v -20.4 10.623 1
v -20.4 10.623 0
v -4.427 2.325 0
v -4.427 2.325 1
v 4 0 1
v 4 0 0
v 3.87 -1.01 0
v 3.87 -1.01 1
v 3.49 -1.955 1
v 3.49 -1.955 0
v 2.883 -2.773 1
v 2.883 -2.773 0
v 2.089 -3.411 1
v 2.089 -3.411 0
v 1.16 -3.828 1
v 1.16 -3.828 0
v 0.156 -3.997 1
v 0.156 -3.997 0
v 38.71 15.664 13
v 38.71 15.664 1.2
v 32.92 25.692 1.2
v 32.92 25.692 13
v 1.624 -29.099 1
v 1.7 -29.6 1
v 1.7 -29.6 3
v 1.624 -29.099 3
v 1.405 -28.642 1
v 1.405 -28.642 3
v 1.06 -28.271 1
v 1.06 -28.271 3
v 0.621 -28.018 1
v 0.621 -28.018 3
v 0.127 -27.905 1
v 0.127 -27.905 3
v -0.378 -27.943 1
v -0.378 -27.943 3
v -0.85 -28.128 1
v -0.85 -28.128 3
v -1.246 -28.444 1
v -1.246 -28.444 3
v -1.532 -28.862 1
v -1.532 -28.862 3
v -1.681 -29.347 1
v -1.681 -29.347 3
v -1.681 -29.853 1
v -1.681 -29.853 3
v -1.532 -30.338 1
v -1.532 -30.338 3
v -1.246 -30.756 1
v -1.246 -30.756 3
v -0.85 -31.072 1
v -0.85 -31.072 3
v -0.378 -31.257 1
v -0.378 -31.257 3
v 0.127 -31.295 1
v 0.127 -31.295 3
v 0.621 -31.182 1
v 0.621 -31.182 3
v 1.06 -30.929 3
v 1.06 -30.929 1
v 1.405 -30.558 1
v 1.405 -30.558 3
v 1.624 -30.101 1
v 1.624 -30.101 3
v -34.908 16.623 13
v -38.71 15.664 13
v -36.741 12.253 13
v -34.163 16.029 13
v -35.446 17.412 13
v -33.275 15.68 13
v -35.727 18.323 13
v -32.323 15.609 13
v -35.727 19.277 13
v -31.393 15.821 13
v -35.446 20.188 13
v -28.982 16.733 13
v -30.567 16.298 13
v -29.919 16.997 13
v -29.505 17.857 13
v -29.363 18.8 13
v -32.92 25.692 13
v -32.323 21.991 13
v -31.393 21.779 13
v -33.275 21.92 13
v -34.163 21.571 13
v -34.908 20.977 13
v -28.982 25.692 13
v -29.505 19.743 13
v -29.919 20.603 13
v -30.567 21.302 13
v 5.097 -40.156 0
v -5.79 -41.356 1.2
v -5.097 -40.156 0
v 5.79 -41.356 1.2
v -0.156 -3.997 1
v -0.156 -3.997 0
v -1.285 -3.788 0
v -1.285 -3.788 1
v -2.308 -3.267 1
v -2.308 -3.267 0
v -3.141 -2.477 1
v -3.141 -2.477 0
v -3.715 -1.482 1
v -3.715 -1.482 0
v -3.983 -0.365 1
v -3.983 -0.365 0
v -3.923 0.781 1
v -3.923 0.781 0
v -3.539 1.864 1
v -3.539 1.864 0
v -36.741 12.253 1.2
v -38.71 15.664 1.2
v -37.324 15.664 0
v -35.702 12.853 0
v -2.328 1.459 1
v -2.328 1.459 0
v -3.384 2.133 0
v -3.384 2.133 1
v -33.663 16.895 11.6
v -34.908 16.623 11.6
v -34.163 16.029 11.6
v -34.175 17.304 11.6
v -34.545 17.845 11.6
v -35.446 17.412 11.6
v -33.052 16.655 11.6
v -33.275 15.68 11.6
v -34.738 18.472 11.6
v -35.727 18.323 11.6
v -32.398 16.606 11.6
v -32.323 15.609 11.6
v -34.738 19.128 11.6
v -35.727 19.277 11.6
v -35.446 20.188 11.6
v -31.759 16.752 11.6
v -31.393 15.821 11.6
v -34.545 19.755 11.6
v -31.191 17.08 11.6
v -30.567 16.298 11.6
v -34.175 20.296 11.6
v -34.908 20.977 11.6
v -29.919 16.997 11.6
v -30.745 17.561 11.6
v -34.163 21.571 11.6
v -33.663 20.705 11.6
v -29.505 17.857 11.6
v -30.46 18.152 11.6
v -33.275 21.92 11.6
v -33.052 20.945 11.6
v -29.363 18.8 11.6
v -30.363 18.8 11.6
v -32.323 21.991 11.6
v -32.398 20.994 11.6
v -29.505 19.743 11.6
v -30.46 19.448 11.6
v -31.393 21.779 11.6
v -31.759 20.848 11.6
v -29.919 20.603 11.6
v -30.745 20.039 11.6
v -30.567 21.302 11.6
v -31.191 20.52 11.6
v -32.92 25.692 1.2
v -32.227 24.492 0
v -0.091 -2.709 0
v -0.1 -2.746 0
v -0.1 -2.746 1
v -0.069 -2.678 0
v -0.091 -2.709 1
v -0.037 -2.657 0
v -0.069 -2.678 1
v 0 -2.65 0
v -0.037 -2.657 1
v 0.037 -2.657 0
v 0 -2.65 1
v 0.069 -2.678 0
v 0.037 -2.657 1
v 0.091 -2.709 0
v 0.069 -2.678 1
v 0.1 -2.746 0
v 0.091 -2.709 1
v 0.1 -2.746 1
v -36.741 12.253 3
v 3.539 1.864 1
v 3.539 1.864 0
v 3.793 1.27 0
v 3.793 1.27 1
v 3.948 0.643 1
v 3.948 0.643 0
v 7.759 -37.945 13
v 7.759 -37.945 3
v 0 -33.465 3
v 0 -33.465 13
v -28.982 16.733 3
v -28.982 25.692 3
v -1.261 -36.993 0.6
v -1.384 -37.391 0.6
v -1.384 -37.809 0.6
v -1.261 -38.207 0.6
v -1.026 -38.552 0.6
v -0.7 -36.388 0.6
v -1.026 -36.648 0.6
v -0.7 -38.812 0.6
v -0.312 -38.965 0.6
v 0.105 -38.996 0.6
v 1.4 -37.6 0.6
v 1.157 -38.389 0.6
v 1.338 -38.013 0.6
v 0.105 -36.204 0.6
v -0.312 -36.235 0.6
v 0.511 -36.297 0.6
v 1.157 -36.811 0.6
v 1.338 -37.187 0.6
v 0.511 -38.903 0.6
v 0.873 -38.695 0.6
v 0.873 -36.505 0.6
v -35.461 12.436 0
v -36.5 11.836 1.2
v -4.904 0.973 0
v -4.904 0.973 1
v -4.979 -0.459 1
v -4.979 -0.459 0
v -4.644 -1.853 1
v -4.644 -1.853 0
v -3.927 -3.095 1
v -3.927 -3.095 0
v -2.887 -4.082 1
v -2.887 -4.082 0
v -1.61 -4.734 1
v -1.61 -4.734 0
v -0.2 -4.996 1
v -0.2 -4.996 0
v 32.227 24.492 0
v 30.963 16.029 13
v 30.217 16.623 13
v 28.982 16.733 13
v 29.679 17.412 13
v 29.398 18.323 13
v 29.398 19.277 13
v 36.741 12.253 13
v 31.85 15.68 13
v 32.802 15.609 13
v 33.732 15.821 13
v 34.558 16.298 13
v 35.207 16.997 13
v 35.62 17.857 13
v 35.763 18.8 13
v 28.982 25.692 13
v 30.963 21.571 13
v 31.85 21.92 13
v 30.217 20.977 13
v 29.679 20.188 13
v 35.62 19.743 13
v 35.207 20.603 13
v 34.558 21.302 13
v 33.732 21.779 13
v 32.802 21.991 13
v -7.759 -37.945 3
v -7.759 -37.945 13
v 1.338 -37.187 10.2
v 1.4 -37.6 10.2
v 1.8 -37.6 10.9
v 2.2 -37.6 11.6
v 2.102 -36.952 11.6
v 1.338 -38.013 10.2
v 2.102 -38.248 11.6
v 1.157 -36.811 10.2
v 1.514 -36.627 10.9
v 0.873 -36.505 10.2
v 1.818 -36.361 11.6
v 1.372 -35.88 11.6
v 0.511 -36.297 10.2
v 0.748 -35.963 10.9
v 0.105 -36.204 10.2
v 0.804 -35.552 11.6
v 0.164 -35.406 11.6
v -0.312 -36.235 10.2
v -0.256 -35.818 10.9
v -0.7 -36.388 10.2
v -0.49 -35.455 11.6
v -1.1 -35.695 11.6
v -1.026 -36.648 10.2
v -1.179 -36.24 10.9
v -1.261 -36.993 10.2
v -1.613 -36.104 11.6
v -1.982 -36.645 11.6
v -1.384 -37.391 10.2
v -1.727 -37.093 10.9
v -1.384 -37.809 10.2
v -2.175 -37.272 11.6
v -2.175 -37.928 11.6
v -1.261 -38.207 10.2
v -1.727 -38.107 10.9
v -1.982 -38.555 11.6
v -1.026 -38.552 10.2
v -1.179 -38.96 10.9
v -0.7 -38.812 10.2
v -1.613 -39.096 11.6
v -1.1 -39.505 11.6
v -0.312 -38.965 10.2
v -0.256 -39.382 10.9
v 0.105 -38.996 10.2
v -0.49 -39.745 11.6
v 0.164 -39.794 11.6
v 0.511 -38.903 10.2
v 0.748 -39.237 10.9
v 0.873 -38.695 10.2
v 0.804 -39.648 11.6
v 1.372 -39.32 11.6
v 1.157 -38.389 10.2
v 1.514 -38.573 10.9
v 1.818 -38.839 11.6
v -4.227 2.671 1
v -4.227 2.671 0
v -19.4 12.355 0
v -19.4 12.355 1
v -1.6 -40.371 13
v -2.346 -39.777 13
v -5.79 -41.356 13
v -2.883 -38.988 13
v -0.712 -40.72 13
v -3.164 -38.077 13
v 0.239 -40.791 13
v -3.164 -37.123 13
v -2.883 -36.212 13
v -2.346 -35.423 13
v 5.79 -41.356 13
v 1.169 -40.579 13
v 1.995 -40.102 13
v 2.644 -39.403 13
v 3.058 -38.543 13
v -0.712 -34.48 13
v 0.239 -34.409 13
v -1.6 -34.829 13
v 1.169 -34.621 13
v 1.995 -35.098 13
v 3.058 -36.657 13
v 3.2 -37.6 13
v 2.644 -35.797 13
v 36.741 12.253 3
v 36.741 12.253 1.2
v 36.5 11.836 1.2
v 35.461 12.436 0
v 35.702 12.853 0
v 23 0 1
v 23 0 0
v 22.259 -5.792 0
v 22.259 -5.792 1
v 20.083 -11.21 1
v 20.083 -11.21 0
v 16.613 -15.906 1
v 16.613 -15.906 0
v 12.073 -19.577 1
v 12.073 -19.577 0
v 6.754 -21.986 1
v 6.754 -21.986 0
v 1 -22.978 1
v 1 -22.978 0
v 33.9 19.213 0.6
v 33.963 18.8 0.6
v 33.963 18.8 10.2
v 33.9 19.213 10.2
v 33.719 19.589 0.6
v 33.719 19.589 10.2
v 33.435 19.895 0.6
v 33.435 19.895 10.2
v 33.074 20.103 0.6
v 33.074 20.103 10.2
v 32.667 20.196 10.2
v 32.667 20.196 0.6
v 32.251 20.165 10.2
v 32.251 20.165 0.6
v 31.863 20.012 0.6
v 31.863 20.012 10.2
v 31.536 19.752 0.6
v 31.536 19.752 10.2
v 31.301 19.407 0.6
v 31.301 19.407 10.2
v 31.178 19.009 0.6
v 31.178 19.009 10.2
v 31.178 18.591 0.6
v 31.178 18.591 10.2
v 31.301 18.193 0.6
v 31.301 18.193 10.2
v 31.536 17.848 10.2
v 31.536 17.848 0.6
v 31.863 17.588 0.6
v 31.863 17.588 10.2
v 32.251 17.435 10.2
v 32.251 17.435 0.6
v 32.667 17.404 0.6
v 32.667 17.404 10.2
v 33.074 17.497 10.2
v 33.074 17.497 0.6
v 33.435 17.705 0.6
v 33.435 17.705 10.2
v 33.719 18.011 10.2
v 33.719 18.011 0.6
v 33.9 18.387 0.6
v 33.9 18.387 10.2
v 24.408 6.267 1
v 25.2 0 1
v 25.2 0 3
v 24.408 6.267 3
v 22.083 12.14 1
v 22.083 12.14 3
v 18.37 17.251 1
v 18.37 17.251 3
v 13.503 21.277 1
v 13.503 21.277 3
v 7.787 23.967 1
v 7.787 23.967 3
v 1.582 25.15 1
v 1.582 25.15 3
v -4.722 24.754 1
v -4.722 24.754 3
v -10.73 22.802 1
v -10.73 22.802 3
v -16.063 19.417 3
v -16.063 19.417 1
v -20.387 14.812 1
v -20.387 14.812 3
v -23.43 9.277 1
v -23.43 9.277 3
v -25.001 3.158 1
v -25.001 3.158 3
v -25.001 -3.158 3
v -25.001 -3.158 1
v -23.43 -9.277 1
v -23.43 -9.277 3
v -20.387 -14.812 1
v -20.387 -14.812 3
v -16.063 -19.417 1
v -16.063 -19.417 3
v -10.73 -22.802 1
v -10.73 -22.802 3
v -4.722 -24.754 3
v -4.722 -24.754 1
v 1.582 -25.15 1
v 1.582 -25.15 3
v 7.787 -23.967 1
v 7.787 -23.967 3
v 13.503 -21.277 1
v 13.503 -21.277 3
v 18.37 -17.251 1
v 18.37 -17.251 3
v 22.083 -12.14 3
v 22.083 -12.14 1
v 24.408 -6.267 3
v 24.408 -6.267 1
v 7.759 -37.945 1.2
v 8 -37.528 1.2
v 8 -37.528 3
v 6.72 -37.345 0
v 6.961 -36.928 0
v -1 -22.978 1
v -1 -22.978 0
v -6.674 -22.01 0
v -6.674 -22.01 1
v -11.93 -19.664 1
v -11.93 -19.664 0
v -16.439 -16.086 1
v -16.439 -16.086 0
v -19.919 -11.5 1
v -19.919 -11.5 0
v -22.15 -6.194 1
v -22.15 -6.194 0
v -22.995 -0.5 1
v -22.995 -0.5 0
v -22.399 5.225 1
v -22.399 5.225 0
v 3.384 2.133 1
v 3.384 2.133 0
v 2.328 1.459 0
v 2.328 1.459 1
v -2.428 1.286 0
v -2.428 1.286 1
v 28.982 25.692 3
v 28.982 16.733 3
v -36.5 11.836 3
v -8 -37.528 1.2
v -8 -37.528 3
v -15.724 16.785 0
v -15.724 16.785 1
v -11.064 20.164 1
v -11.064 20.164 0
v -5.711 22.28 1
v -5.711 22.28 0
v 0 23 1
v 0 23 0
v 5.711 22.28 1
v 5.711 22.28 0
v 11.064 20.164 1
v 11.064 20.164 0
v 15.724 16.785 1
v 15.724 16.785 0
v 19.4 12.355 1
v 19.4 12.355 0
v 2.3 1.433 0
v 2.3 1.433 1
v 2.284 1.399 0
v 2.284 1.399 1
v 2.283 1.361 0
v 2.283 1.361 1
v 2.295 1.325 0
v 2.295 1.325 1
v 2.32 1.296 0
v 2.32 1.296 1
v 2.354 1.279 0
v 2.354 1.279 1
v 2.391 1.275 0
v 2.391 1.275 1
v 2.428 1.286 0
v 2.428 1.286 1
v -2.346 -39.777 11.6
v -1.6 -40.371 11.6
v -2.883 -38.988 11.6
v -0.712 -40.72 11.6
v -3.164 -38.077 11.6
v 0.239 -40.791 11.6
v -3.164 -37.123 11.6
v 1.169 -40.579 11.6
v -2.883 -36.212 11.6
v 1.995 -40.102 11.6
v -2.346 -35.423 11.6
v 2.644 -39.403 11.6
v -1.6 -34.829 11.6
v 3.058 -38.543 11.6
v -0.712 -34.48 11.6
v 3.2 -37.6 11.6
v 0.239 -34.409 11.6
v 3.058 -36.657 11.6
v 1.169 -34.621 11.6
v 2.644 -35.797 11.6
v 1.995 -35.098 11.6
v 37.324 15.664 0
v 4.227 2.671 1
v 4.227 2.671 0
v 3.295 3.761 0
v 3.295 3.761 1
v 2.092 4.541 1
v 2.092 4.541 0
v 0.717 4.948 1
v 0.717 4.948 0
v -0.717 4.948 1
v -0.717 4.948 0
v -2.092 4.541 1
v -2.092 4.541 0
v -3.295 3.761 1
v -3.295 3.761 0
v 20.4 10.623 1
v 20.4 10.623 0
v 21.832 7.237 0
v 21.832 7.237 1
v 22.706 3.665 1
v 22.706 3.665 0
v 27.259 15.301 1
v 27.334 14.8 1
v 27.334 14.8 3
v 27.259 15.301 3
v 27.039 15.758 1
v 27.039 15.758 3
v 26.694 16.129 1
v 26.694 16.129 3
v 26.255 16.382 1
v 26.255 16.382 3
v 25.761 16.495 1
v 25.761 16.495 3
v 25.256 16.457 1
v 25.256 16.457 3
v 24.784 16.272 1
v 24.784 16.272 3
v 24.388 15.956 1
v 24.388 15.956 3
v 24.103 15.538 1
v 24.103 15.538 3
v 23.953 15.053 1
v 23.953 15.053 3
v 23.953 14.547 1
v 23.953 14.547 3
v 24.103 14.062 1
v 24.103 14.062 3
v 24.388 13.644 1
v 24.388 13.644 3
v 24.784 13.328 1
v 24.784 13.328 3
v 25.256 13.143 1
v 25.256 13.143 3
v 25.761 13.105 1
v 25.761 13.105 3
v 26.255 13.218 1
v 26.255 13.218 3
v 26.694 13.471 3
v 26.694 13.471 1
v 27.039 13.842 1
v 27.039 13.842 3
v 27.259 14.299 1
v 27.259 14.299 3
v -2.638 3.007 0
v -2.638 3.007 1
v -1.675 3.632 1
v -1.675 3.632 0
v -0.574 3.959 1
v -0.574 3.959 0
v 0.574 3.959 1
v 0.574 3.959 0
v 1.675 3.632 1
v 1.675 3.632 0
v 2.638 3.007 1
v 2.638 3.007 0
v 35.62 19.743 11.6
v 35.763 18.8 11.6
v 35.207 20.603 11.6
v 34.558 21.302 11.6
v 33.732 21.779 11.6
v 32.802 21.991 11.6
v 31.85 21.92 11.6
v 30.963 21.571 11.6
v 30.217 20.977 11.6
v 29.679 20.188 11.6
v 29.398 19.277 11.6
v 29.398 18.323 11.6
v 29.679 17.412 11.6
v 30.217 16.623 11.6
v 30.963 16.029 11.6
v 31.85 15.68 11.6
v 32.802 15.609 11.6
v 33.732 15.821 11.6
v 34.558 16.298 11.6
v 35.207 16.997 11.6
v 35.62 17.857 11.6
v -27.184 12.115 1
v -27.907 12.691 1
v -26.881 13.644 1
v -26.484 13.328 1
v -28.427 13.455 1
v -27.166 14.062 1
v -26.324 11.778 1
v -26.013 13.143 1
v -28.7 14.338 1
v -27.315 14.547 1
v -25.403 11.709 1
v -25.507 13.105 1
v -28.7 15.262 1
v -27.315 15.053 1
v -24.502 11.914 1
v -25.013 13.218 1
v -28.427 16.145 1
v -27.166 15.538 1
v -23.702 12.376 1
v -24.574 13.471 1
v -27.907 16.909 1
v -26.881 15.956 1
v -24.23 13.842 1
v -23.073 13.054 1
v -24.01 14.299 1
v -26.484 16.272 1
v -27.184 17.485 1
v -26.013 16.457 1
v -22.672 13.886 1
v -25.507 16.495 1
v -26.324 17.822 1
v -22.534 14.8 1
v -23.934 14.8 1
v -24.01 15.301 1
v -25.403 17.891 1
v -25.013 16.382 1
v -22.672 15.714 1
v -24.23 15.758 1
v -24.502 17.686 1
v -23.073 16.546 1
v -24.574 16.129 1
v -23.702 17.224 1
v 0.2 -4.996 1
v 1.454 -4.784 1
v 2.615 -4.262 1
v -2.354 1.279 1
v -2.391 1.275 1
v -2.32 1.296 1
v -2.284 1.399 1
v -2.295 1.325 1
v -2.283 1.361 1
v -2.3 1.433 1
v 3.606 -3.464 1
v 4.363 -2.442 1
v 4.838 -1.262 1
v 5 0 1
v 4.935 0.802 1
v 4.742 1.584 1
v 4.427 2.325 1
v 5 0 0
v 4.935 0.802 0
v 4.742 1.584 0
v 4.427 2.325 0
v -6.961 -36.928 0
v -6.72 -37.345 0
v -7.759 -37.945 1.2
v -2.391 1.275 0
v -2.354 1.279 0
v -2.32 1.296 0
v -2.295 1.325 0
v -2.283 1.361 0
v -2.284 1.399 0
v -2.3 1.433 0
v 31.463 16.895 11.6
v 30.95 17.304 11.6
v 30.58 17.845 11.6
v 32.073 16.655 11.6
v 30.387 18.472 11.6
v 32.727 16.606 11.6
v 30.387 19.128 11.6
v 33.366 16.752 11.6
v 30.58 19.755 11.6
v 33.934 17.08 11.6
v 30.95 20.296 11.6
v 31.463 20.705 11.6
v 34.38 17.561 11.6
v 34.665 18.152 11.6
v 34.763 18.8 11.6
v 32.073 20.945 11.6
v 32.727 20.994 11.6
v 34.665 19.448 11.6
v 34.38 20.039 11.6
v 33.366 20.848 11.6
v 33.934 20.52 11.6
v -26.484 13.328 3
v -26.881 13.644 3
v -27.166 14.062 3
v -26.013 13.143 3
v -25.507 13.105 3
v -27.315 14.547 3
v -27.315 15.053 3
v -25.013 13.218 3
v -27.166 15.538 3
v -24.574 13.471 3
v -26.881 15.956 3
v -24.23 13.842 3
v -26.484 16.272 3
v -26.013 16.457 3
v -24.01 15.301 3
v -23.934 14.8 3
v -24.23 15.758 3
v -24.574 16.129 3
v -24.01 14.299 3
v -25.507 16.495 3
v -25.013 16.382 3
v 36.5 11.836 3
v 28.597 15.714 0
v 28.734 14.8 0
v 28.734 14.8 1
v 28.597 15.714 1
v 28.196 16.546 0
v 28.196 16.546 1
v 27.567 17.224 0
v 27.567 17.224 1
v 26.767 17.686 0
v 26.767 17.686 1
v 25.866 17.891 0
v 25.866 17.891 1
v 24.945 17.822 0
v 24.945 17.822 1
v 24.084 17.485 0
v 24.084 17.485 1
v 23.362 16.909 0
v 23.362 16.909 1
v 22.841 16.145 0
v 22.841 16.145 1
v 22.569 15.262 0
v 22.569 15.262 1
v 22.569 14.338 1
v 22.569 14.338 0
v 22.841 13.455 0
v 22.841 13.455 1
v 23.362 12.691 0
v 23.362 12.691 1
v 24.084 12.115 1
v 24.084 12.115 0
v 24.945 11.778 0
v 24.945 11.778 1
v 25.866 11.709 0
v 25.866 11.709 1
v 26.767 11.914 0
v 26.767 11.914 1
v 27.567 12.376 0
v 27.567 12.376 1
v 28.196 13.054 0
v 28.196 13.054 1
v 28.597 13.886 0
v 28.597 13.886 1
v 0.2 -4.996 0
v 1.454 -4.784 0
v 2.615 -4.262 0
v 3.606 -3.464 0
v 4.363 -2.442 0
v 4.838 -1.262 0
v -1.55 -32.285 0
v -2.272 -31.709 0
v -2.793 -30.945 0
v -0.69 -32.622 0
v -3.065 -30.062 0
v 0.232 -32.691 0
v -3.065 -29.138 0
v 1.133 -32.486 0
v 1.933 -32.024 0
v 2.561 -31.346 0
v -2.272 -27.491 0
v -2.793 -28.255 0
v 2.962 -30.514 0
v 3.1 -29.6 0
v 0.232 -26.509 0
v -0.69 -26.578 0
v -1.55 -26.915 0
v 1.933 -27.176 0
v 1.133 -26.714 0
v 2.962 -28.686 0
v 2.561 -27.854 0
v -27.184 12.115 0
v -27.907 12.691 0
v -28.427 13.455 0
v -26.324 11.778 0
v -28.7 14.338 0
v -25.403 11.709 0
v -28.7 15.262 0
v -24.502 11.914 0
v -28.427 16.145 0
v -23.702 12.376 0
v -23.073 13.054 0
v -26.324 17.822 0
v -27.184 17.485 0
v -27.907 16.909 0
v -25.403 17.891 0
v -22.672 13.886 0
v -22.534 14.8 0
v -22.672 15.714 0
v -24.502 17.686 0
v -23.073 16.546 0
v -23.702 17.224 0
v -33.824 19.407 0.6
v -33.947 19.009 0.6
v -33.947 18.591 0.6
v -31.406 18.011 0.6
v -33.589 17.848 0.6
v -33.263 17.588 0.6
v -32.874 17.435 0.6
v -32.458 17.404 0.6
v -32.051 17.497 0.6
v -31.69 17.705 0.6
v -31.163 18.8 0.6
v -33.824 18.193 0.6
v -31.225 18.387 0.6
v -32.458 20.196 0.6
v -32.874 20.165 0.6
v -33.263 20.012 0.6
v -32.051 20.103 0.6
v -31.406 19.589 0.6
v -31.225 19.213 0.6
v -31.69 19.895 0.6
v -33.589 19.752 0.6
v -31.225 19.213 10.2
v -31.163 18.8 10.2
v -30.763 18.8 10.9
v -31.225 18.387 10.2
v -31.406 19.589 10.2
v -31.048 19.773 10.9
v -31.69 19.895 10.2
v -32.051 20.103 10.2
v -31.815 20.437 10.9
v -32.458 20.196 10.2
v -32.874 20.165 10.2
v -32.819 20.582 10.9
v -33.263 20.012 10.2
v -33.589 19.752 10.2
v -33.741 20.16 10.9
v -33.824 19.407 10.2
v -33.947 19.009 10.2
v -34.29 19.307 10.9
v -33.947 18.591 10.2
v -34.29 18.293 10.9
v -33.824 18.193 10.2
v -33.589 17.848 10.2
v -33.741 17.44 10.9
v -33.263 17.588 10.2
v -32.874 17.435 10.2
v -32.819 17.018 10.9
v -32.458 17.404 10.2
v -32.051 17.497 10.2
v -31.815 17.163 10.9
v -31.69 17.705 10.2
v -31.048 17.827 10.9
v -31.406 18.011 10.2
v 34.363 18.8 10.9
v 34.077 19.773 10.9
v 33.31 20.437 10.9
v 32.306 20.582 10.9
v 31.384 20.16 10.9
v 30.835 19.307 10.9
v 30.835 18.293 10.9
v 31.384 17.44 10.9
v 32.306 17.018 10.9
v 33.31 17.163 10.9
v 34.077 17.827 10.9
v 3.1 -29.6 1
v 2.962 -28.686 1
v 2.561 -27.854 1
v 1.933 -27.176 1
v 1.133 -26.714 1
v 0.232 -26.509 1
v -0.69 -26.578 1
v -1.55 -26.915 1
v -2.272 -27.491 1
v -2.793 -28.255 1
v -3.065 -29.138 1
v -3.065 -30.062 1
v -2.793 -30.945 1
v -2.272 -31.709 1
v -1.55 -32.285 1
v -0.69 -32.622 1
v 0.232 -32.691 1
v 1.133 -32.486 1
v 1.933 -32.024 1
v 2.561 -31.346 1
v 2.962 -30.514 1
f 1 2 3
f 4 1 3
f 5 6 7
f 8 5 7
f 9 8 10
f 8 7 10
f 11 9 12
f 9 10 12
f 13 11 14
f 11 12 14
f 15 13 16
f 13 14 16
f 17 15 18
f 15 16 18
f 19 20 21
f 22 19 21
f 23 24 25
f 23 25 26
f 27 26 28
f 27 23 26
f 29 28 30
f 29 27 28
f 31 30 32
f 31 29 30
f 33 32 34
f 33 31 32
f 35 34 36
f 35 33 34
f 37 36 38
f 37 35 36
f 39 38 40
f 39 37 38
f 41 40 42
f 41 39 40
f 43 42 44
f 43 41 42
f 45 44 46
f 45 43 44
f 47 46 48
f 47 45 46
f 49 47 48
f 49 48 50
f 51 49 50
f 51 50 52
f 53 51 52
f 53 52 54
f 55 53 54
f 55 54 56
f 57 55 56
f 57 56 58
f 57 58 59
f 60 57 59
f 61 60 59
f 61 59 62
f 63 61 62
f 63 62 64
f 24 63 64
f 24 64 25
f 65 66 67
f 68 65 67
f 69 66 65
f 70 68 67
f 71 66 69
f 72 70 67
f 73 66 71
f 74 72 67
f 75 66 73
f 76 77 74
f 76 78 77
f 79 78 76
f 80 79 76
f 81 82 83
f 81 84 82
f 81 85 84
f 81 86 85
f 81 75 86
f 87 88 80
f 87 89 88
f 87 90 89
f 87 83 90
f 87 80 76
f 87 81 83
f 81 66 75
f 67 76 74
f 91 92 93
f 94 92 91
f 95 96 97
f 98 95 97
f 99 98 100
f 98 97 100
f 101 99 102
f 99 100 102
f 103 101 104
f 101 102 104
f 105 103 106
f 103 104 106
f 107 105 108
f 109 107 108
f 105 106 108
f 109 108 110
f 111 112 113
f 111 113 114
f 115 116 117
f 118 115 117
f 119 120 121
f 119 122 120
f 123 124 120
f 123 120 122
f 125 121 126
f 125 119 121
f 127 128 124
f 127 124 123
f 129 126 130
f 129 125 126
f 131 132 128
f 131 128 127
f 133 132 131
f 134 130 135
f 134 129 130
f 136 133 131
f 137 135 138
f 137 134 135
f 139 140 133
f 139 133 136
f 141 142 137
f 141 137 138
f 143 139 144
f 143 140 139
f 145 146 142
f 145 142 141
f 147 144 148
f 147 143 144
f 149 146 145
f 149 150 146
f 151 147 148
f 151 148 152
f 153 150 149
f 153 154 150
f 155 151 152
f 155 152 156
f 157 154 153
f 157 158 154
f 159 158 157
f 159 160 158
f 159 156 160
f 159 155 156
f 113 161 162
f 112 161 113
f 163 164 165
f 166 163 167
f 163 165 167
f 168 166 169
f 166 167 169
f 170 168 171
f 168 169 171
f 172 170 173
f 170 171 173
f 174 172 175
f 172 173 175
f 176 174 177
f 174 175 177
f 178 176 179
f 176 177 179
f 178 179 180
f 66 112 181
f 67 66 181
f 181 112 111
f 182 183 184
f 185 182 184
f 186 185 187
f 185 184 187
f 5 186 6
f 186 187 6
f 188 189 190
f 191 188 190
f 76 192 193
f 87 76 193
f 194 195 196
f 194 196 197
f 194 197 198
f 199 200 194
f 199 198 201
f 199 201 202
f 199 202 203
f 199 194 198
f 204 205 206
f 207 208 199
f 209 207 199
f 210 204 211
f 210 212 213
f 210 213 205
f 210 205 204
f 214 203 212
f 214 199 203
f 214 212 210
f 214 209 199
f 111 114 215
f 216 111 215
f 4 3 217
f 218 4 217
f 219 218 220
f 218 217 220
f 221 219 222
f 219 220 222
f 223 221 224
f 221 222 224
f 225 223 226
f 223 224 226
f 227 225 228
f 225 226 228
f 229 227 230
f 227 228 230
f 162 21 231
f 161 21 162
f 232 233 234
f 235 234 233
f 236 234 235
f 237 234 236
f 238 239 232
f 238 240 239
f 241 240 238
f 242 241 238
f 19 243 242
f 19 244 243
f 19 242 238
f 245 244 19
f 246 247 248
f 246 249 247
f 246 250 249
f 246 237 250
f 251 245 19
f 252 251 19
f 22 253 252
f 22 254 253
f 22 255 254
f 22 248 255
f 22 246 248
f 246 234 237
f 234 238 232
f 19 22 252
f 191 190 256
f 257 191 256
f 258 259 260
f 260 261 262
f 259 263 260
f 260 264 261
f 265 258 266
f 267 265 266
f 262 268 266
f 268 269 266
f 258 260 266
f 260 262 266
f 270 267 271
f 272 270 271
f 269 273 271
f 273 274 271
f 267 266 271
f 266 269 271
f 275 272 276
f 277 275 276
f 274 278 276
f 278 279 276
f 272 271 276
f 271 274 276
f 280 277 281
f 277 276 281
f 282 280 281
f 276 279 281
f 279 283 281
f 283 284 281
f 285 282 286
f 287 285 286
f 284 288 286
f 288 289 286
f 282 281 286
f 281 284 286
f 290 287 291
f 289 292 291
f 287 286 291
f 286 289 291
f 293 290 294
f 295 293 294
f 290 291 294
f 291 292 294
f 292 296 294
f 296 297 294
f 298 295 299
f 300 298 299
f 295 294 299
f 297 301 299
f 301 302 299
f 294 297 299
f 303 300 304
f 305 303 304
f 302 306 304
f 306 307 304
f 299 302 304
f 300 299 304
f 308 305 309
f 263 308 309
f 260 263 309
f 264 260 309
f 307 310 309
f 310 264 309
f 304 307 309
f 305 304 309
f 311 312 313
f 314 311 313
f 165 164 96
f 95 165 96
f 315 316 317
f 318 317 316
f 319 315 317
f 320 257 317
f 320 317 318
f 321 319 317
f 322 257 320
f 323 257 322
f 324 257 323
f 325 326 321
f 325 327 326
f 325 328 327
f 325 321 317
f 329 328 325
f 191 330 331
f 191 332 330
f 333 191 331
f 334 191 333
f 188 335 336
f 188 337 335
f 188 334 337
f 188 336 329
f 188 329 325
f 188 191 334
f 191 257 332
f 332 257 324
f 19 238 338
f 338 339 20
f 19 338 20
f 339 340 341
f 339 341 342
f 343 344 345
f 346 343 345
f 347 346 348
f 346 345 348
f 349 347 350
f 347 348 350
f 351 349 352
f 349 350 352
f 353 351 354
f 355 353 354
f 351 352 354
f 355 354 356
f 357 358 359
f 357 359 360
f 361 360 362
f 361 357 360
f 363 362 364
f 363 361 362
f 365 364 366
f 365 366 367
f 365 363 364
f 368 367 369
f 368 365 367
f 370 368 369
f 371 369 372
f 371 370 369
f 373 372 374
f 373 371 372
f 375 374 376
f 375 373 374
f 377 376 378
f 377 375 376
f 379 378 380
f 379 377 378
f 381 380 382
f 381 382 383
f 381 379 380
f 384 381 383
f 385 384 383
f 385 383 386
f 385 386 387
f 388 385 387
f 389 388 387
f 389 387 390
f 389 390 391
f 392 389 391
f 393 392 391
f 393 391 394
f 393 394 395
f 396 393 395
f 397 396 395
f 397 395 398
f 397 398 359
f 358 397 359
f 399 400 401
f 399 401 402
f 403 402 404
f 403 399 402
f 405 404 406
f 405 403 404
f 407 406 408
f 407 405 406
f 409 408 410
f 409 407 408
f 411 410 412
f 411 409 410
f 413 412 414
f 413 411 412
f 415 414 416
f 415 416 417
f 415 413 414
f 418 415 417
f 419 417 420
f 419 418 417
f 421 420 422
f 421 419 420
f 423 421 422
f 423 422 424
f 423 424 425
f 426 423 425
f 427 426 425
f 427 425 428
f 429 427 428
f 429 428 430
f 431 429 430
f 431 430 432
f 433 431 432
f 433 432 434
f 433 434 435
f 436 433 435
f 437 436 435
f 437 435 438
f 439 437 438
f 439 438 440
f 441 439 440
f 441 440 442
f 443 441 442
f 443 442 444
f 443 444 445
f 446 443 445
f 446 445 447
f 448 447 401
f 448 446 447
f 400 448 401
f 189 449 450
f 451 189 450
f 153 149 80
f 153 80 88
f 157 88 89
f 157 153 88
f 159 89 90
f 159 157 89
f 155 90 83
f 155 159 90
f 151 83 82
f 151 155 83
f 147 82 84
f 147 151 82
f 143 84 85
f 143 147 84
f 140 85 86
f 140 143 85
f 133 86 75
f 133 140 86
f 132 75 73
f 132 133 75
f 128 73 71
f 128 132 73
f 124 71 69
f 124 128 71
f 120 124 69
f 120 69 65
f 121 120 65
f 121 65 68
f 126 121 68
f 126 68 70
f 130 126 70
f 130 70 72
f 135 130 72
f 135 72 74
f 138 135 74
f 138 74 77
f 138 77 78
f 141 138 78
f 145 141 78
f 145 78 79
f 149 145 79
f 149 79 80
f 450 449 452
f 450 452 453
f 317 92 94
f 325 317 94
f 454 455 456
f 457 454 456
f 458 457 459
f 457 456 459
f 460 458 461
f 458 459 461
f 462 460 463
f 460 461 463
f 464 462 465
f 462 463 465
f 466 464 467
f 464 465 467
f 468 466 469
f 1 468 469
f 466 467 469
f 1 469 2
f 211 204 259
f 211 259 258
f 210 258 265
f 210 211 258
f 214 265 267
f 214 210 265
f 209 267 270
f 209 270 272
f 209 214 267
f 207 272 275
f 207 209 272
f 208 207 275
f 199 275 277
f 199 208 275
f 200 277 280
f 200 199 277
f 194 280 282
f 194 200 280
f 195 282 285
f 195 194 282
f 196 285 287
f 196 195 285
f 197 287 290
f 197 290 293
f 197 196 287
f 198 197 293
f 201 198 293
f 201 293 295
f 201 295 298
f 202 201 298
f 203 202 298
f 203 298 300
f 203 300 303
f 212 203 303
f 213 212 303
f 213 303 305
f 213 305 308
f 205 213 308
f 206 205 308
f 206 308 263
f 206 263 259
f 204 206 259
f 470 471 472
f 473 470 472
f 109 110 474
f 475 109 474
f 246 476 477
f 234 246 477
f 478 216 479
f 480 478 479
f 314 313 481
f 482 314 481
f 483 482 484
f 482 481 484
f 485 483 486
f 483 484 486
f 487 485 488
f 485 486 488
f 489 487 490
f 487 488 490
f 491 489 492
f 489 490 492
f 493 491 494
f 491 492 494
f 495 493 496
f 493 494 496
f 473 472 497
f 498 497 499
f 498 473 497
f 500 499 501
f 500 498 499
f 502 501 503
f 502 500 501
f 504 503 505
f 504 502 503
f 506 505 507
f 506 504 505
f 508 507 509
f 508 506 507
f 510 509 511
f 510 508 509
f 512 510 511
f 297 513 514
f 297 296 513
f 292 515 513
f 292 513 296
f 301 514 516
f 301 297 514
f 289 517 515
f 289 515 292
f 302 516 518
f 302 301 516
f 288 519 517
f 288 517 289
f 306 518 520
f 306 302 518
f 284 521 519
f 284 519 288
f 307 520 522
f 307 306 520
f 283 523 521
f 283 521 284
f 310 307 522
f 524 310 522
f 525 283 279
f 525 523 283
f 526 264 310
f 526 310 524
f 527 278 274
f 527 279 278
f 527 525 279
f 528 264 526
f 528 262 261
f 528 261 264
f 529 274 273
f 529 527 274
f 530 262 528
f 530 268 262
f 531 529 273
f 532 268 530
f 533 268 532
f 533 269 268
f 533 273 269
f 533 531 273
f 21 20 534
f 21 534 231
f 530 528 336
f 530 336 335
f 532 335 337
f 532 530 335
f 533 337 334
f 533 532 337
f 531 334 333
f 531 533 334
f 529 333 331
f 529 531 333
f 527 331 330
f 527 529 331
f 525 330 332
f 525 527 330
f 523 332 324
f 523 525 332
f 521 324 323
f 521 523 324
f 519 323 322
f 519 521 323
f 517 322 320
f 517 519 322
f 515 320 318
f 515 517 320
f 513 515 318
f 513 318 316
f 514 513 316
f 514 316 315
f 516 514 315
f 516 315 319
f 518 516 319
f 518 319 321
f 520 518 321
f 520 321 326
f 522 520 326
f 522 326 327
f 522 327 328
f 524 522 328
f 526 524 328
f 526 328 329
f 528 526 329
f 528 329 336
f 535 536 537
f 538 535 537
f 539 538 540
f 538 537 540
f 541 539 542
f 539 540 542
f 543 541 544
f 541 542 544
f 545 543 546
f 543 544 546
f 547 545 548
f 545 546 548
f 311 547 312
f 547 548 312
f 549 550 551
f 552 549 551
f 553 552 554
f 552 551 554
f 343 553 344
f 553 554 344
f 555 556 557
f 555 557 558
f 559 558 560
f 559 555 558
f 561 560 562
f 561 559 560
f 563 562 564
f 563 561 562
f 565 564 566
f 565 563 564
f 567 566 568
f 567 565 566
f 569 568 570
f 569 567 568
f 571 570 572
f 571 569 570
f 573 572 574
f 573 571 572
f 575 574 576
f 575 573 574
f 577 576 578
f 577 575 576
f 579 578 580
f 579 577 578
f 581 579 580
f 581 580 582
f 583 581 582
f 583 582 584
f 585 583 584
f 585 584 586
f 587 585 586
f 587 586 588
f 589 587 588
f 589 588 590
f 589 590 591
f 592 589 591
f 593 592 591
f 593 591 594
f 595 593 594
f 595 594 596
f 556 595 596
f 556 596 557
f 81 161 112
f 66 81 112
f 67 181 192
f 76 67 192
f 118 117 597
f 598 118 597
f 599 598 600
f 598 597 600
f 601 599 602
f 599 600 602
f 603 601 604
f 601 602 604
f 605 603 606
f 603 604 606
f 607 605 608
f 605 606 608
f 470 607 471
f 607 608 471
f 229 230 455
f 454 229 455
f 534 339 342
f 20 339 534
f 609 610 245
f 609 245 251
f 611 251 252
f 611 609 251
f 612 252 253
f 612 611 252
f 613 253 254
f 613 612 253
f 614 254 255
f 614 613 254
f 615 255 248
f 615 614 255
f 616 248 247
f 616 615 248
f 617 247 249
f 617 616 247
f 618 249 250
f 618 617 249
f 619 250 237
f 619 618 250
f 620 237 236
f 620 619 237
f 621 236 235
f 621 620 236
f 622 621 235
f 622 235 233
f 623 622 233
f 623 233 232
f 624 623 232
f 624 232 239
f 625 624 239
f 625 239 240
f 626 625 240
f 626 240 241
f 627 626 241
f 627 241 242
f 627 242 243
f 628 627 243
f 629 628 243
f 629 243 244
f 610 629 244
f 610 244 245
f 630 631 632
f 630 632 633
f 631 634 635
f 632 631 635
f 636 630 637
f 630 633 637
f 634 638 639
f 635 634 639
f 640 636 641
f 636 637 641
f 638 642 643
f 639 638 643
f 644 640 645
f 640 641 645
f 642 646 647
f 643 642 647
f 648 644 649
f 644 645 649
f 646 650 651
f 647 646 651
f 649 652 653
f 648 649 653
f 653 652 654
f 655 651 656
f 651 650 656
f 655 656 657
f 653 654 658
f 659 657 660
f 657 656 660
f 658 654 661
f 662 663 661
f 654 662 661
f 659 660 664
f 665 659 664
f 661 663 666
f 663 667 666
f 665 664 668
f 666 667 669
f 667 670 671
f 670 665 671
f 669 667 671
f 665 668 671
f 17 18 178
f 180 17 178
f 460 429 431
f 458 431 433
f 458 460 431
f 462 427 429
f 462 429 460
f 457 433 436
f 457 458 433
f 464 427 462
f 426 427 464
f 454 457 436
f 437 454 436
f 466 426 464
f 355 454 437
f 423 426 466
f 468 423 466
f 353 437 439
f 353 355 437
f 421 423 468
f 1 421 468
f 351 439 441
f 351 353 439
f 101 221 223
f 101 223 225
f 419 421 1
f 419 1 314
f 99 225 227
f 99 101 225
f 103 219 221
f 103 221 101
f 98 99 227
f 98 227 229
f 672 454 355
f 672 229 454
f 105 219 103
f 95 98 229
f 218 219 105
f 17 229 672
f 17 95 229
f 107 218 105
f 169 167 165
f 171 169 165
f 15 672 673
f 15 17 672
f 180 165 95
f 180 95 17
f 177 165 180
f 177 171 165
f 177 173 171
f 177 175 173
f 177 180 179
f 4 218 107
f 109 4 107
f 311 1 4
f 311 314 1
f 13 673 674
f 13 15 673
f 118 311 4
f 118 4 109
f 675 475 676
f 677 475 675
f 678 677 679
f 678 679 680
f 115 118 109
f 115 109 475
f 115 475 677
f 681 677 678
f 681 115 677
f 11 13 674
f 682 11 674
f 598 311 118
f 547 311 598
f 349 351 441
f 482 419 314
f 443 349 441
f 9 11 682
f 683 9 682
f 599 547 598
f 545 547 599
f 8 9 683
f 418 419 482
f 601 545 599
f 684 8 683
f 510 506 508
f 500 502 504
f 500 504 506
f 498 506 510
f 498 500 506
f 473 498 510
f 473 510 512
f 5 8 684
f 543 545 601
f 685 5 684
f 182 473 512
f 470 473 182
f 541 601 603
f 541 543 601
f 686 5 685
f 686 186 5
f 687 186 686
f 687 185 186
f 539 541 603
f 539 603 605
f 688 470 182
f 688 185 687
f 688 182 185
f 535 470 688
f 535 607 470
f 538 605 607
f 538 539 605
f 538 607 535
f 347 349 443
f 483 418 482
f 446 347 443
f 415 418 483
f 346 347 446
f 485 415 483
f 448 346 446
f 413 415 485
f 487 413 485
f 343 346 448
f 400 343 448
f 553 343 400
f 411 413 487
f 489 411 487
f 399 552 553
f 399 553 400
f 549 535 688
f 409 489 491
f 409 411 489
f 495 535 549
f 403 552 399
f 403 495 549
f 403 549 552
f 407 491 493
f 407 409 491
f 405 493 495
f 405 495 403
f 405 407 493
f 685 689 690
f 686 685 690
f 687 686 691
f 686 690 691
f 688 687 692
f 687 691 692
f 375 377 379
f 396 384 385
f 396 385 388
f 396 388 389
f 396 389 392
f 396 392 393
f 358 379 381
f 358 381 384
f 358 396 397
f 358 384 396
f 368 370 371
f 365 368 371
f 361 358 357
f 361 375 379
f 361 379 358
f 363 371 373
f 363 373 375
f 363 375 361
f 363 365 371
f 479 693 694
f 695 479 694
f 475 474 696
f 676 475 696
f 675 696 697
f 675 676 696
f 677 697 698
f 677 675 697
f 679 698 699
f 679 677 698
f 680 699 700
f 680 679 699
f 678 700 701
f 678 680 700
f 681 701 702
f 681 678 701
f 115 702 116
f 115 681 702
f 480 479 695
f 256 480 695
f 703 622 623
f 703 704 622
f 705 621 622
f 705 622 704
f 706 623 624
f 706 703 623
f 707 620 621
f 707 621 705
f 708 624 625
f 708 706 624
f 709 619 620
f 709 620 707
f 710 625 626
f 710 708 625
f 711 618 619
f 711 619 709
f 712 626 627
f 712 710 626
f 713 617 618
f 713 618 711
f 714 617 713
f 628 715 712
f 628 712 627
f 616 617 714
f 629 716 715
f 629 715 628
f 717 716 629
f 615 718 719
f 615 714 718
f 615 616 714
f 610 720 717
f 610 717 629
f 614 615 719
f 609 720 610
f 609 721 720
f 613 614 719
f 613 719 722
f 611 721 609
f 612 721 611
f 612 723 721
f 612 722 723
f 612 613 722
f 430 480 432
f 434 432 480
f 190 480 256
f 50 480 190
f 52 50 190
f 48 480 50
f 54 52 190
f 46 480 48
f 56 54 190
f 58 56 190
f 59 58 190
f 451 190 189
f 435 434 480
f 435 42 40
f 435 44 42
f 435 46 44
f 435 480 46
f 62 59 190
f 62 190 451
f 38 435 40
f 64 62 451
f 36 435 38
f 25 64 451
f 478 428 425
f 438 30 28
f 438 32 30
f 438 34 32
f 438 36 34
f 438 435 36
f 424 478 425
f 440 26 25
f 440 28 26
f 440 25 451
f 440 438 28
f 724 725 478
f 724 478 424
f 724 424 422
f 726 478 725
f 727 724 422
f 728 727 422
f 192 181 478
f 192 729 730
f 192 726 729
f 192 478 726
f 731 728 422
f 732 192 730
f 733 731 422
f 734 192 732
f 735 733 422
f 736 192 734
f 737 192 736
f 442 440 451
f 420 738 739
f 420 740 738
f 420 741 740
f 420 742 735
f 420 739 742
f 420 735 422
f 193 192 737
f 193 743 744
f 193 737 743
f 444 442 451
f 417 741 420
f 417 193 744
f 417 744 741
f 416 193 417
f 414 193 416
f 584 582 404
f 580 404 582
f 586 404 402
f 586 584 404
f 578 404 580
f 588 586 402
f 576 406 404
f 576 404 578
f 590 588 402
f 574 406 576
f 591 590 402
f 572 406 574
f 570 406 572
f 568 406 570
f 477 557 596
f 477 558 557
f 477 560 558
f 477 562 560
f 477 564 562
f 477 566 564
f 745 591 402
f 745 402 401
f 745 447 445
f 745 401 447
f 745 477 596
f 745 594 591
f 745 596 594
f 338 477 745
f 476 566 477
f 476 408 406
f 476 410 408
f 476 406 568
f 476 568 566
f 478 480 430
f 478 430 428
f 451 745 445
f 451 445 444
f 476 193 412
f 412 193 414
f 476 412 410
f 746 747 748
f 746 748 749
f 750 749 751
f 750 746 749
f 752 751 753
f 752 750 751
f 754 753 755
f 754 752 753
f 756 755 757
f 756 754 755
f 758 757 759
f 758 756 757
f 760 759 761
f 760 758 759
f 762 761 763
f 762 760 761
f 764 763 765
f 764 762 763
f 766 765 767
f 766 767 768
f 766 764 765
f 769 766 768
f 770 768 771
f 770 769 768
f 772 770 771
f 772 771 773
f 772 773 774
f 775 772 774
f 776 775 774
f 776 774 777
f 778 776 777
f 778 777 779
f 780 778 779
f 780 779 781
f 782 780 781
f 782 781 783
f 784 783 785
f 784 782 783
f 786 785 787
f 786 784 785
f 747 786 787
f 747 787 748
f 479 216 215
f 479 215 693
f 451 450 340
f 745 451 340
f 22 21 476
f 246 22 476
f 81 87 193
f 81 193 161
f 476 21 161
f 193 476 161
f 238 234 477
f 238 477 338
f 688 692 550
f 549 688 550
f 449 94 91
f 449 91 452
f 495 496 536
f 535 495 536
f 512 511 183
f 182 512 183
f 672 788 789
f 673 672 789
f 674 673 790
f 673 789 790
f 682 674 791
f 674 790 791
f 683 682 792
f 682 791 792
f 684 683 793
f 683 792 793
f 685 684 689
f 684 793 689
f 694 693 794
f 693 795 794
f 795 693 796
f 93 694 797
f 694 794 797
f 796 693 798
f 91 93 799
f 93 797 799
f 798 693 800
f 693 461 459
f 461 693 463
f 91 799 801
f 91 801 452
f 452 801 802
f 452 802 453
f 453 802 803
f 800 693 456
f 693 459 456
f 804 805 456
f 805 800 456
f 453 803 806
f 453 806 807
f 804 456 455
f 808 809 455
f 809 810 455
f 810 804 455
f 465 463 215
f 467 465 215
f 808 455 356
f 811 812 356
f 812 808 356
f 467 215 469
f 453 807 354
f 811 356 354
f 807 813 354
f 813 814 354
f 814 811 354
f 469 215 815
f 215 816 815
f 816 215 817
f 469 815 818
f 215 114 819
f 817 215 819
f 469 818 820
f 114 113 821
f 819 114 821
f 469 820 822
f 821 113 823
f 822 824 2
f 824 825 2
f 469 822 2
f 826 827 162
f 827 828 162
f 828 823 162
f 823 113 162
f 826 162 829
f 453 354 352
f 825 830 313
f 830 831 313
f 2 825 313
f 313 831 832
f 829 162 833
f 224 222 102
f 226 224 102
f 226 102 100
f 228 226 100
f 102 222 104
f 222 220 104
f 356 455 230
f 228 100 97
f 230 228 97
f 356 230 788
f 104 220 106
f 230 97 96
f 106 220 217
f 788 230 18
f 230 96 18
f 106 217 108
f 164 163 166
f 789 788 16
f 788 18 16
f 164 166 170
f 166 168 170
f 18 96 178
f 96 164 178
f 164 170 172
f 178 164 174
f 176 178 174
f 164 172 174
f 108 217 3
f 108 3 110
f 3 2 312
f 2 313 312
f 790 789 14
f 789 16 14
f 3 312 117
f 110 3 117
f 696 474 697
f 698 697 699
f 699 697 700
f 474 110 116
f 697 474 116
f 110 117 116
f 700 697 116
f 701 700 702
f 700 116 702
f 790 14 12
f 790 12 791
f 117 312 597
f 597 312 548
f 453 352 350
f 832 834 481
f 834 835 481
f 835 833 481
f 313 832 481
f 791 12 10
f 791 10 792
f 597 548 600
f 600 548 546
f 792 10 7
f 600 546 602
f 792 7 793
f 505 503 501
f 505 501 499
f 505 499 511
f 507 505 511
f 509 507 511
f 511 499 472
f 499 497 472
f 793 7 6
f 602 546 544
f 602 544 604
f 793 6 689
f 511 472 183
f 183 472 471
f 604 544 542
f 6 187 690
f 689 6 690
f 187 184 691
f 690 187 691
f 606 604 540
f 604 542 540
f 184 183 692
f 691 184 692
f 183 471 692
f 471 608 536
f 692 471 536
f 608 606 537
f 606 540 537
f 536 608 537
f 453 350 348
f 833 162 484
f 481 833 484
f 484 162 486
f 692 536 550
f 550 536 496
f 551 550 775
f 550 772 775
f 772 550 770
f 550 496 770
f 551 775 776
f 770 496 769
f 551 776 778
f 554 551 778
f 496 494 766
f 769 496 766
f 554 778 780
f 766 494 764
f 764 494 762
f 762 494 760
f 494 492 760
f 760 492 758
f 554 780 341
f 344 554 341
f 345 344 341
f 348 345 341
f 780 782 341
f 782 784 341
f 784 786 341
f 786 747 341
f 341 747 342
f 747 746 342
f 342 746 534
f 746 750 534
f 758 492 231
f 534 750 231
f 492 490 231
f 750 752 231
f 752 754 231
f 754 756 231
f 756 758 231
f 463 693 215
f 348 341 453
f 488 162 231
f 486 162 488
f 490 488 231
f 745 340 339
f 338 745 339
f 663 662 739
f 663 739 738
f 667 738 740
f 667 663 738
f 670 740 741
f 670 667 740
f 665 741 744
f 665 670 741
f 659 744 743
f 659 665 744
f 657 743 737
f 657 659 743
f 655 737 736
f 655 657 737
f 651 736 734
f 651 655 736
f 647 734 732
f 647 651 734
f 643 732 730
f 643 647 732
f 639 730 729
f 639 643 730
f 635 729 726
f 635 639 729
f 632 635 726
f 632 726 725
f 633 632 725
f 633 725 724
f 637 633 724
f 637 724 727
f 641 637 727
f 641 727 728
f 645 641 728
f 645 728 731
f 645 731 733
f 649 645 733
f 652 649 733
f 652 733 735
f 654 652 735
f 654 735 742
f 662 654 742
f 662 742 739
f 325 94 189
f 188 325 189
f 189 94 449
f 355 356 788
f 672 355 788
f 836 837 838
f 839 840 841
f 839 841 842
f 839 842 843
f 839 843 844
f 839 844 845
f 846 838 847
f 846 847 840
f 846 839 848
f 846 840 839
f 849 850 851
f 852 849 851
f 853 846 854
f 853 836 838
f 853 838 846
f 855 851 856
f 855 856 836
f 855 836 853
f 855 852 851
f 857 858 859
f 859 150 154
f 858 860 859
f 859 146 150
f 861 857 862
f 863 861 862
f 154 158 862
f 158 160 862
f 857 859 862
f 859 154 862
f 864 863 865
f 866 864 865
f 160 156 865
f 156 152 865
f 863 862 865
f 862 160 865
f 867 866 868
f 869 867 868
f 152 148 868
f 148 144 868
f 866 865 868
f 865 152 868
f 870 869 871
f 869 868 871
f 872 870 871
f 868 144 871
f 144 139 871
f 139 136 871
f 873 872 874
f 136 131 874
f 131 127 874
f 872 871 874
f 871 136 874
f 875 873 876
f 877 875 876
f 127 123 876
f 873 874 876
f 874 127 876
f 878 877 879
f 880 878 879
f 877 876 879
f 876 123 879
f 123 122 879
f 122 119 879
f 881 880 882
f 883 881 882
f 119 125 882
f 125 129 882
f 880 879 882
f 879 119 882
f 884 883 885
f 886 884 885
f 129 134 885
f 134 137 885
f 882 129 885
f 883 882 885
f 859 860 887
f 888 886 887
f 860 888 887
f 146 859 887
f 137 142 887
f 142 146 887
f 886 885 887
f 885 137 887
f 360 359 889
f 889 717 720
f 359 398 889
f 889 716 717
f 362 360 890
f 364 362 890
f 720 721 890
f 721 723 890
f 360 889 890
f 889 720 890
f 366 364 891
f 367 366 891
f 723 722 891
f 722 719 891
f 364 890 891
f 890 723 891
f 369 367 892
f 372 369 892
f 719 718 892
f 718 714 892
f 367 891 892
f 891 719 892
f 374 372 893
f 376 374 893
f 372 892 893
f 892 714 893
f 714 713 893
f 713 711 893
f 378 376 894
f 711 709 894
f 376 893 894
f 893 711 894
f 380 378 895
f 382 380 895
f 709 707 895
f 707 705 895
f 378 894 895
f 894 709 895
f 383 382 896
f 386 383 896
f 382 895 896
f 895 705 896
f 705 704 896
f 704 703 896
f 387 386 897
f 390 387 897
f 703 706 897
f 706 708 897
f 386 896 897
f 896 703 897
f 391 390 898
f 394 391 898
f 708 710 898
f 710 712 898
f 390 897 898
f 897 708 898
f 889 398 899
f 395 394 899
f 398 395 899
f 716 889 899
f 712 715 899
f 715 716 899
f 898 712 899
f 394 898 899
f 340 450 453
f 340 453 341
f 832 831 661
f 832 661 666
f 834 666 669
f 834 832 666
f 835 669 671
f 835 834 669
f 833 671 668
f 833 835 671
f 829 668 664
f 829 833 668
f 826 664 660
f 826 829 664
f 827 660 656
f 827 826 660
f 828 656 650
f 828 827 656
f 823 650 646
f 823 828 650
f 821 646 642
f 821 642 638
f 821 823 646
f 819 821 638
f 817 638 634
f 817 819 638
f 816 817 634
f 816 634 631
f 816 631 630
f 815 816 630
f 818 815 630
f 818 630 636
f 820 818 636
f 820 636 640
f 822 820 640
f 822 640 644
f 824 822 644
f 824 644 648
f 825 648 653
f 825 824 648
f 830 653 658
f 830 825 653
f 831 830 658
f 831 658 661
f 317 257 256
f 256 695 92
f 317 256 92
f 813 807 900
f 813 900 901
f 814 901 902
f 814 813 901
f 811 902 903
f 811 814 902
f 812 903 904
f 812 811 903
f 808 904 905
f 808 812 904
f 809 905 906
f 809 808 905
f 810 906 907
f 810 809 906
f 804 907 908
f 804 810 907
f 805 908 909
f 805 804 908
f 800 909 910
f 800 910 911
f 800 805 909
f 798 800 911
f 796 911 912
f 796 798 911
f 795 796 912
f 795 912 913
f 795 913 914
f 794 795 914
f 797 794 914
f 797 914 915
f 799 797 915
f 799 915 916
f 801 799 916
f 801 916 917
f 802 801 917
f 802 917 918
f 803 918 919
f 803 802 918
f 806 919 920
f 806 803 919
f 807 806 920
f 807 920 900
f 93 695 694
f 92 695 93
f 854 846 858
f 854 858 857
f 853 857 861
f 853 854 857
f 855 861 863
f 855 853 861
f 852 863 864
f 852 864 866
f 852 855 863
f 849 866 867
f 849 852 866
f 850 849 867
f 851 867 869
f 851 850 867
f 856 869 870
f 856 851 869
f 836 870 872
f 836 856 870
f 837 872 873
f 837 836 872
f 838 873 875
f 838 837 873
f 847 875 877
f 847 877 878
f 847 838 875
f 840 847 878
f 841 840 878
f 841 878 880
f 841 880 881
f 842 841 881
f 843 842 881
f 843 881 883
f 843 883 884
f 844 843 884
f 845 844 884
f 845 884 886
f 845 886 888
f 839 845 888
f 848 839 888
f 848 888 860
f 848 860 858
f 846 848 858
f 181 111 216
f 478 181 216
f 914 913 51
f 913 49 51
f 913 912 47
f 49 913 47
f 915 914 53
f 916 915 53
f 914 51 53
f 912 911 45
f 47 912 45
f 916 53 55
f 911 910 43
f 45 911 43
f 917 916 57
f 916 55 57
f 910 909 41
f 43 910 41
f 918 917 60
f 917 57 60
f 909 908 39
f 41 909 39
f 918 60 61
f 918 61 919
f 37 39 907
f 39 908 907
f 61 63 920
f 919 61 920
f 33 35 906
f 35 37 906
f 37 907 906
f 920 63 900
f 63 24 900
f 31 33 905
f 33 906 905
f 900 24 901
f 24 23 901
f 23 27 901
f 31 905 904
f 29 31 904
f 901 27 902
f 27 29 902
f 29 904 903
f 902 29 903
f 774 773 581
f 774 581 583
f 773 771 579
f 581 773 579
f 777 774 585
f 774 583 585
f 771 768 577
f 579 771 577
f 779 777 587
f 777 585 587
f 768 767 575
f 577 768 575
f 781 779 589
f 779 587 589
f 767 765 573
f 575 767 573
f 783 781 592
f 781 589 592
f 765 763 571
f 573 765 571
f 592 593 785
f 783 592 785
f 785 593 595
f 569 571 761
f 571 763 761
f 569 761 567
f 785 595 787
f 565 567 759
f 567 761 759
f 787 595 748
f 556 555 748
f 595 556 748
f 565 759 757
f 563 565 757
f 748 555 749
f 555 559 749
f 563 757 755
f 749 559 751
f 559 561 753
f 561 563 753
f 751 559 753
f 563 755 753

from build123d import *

# Parameters (mm, degrees)
F0_R       = 3.1
F0_R_2     = 25.2
F0_R_3     = 1.7
F1_DEPTH   = 3
F2_DEPTH   = 1
F0_R_4     = 3.2
F3_DEPTH   = 13
F0_R_5     = 1.4
F4_DEPTH   = 11.6
F5_DEPTH   = 0.6
F6_DEPTH   = 1
F7_SIZE2   = 0.8
F7_SIZE    = 1.4
F7_2_SIZE2 = 0.8
F7_2_SIZE  = 1.4
F7_3_SIZE2 = 0.8
F7_3_SIZE  = 1.4
F8_R       = 0.1
F9_SIZE    = 1.2


with BuildPart() as f1:
    # F0 (on Top) → F1 (new body)
    with BuildSketch(Plane.XY):
        Polygon((28.5, 16.4544826719), (28.5, 25.6920869789), (-28.5, 25.6920869789), (-28.5, 16.4544826719), (-36.5, 11.8356805184), (-8, -37.5277674973), (0, -32.9089653438), (8, -37.5277674973), (36.5, 11.8356805184), align=None)
        with Locations((0, -29.6)):
            Circle(F0_R, mode=Mode.SUBTRACT)
        Circle(F0_R_2, mode=Mode.SUBTRACT)
        with Locations((-25.634351952, 14.8)):
            Circle(F0_R, mode=Mode.SUBTRACT)
        with Locations((25.634351952, 14.8)):
            Circle(F0_R, mode=Mode.SUBTRACT)
        with Locations((-25.634351952, 14.8)):
            Circle(F0_R)
        with Locations((-25.634351952, 14.8)):
            Circle(F0_R_3, mode=Mode.SUBTRACT)
        with Locations((25.634351952, 14.8)):
            Circle(F0_R)
        with Locations((25.634351952, 14.8)):
            Circle(F0_R_3, mode=Mode.SUBTRACT)
        with Locations((0, -29.6)):
            Circle(F0_R)
        with Locations((0, -29.6)):
            Circle(F0_R_3, mode=Mode.SUBTRACT)
        Polygon((-28.5, 16.4544826719), (-28.5, 25.6920869789), (-28.981864252, 25.6920869789), (-28.981864252, 16.7326871275), (-36.740932126, 12.2529872018), (-36.5, 11.8356805184), align=None)
        Polygon((28.981864252, 25.6920869789), (28.5, 25.6920869789), (28.5, 16.4544826719), (36.5, 11.8356805184), (36.740932126, 12.2529872018), (28.981864252, 16.7326871275), align=None)
        Polygon((7.759067874, -37.9450741808), (8, -37.5277674973), (0, -32.9089653438), (-8, -37.5277674973), (-7.759067874, -37.9450741808), (0, -33.4653742551), align=None)
    extrude(amount=F1_DEPTH)

    # F0 (on Top) → F2 (join)
    with BuildSketch(Plane.XY):
        Circle(F0_R_2)
        with BuildLine():
            ThreePointArc((19.3997487421, 12.3551506969), (19.918584287, 11.5), (20.3997487421, 10.6230998893))
            ThreePointArc((20.3997487421, 10.6230998893), (22.3404814302, 5.468353451), (23, 0))
            ThreePointArc((23, 0), (16.6132477258, -15.9059737206), (1, -22.9782505862))
            ThreePointArc((1, -22.9782505862), (0, -23), (-1, -22.9782505862))
            ThreePointArc((-1, -22.9782505862), (-19.918584287, -11.5), (-20.3997487421, 10.6230998893))
            ThreePointArc((-20.3997487421, 10.6230998893), (-19.918584287, 11.5), (-19.3997487421, 12.3551506969))
            ThreePointArc((-19.3997487421, 12.3551506969), (0, 23), (19.3997487421, 12.3551506969))
        make_face(mode=Mode.SUBTRACT)
        with BuildLine():
            Line((1, -22.9782505862), (0.2000154666, -4.9959977795))
            ThreePointArc((0.2000154666, -4.9959977795), (0, -5), (-0.2000154666, -4.9959977795))
            Line((-0.2000154666, -4.9959977795), (-1, -22.9782505862))
            ThreePointArc((-1, -22.9782505862), (0, -23), (1, -22.9782505862))
        make_face()
        with BuildLine():
            ThreePointArc((4.226653261, 2.671217365), (4.3301270189, 2.5), (4.4266687276, 2.3247804145))
            Line((4.4266687276, 2.3247804145), (20.3997487421, 10.6230998893))
            ThreePointArc((20.3997487421, 10.6230998893), (19.918584287, 11.5), (19.3997487421, 12.3551506969))
            Line((19.3997487421, 12.3551506969), (4.226653261, 2.671217365))
        make_face()
        with BuildLine():
            ThreePointArc((-4.4266687276, 2.3247804145), (-4.3301270189, 2.5), (-4.226653261, 2.671217365))
            Line((-4.226653261, 2.671217365), (-19.3997487421, 12.3551506969))
            ThreePointArc((-19.3997487421, 12.3551506969), (-19.918584287, 11.5), (-20.3997487421, 10.6230998893))
            Line((-20.3997487421, 10.6230998893), (-4.4266687276, 2.3247804145))
        make_face()
        with BuildLine():
            Line((-0.2000154666, -4.9959977795), (-0.1555714282, -3.9969735464))
            ThreePointArc((-0.1555714282, -3.9969735464), (-3.4641016151, -2), (-3.5392663435, 1.8637579643))
            Line((-3.5392663435, 1.8637579643), (-4.4266687276, 2.3247804145))
            ThreePointArc((-4.4266687276, 2.3247804145), (-4.3301270189, -2.5), (-0.2000154666, -4.9959977795))
        make_face()
        with BuildLine():
            ThreePointArc((3.5392663435, 1.8637579643), (3.883108637, 0.9599308897), (4, 0))
            ThreePointArc((4, 0), (2.8829052805, -2.7728788548), (0.1555714282, -3.9969735464))
            Line((0.1555714282, -3.9969735464), (0.2000154666, -4.9959977795))
            ThreePointArc((0.2000154666, -4.9959977795), (3.6055566375, -3.4640960341), (5, 0))
            ThreePointArc((5, 0), (4.8545516599, 1.1972168479), (4.4266687276, 2.3247804145))
            Line((4.4266687276, 2.3247804145), (3.5392663435, 1.8637579643))
        make_face()
        with BuildLine():
            ThreePointArc((-3.3836949154, 2.1332155821), (0, 4), (3.3836949154, 2.1332155821))
            Line((3.3836949154, 2.1332155821), (4.226653261, 2.671217365))
            ThreePointArc((4.226653261, 2.671217365), (0, 5), (-4.226653261, 2.671217365))
            Line((-4.226653261, 2.671217365), (-3.3836949154, 2.1332155821))
        make_face()
        with BuildLine():
            Line((0.4330127019, 0.25), (3.5392663435, 1.8637579643))
            ThreePointArc((3.5392663435, 1.8637579643), (3.4641016151, 2), (3.3836949154, 2.1332155821))
            Line((3.3836949154, 2.1332155821), (0.4330127019, 0.25))
        make_face()
        with BuildLine():
            Line((-0.4330127019, 0.25), (-3.3836949154, 2.1332155821))
            ThreePointArc((-3.3836949154, 2.1332155821), (-3.4641016151, 2), (-3.5392663435, 1.8637579643))
            Line((-3.5392663435, 1.8637579643), (-0.4330127019, 0.25))
        make_face()
        with BuildLine():
            ThreePointArc((-0.1555714282, -3.9969735464), (0, -4), (0.1555714282, -3.9969735464))
            Line((0.1555714282, -3.9969735464), (0, -0.5))
            Line((0, -0.5), (-0.1555714282, -3.9969735464))
        make_face()
        with BuildLine():
            Line((0.2000154666, -4.9959977795), (0.1555714282, -3.9969735464))
            ThreePointArc((0.1555714282, -3.9969735464), (0, -4), (-0.1555714282, -3.9969735464))
            Line((-0.1555714282, -3.9969735464), (-0.2000154666, -4.9959977795))
            ThreePointArc((-0.2000154666, -4.9959977795), (0, -5), (0.2000154666, -4.9959977795))
        make_face()
        with BuildLine():
            ThreePointArc((3.3836949154, 2.1332155821), (3.4641016151, 2), (3.5392663435, 1.8637579643))
            Line((3.5392663435, 1.8637579643), (4.4266687276, 2.3247804145))
            ThreePointArc((4.4266687276, 2.3247804145), (4.3301270189, 2.5), (4.226653261, 2.671217365))
            Line((4.226653261, 2.671217365), (3.3836949154, 2.1332155821))
        make_face()
        with BuildLine():
            ThreePointArc((-3.5392663435, 1.8637579643), (-3.4641016151, 2), (-3.3836949154, 2.1332155821))
            Line((-3.3836949154, 2.1332155821), (-4.226653261, 2.671217365))
            ThreePointArc((-4.226653261, 2.671217365), (-4.3301270189, 2.5), (-4.4266687276, 2.3247804145))
            Line((-4.4266687276, 2.3247804145), (-3.5392663435, 1.8637579643))
        make_face()
    extrude(amount=F2_DEPTH)

    # F0 (on Top) → F3 (join)
    with BuildSketch(Plane.XY):
        Polygon((-28.981864252, 16.7326871275), (-28.981864252, 25.6920869789), (-32.9199963413, 25.6920869789), (-38.7099981707, 15.6635096346), (-36.740932126, 12.2529872018), align=None)
        with Locations((-32.5625551823, 18.8)):
            Circle(F0_R_4, mode=Mode.SUBTRACT)
        Polygon((5.7900018293, -41.3555966135), (7.759067874, -37.9450741808), (0, -33.4653742551), (-7.759067874, -37.9450741808), (-5.7900018293, -41.3555966135), align=None)
        with Locations((0, -37.6)):
            Circle(F0_R_4, mode=Mode.SUBTRACT)
        Polygon((32.9199963413, 25.6920869789), (28.981864252, 25.6920869789), (28.981864252, 16.7326871275), (36.740932126, 12.2529872018), (38.7099981707, 15.6635096346), align=None)
        with Locations((32.5625551823, 18.8)):
            Circle(F0_R_4, mode=Mode.SUBTRACT)
    extrude(amount=F3_DEPTH)

    # F0 (on Top) → F4 (join)
    with BuildSketch(Plane.XY):
        with Locations((0, -37.6)):
            Circle(F0_R_4)
        with Locations((0, -37.6)):
            Circle(F0_R_5, mode=Mode.SUBTRACT)
        with Locations((-32.5625551823, 18.8)):
            Circle(F0_R_4)
        with Locations((-32.5625551823, 18.8)):
            Circle(F0_R_5, mode=Mode.SUBTRACT)
        with Locations((32.5625551823, 18.8)):
            Circle(F0_R_4)
        with Locations((32.5625551823, 18.8)):
            Circle(F0_R_5, mode=Mode.SUBTRACT)
    extrude(amount=F4_DEPTH)

    # F0 (on Top) → F5 (join)
    with BuildSketch(Plane.XY):
        with Locations((0, -37.6)):
            Circle(F0_R_5)
        with Locations((-32.5625551823, 18.8)):
            Circle(F0_R_5)
        with Locations((32.5625551823, 18.8)):
            Circle(F0_R_5)
    extrude(amount=F5_DEPTH)

    # F0 (on Top) → F6 (cut)
    with BuildSketch(Plane.XY):
        with Locations((25.634351952, 14.8)):
            Circle(F0_R)
        with Locations((25.634351952, 14.8)):
            Circle(F0_R_3, mode=Mode.SUBTRACT)
        with Locations((-25.634351952, 14.8)):
            Circle(F0_R)
        with Locations((-25.634351952, 14.8)):
            Circle(F0_R_3, mode=Mode.SUBTRACT)
        with Locations((0, -29.6)):
            Circle(F0_R)
        with Locations((0, -29.6)):
            Circle(F0_R_3, mode=Mode.SUBTRACT)
    extrude(amount=F6_DEPTH, mode=Mode.SUBTRACT)

    # F7
    f7_edges = [f1.edges().sort_by_distance(p)[0] for p in [
        (-33.962555, 18.8, 11.6),
    ]]
    f7_side = f1.faces().sort_by_distance((-33.962555, 18.8, 6.1))[0]
    chamfer(f7_edges, length=F7_SIZE, length2=F7_SIZE2, reference=f7_side)

    # F7#2
    f7_2_edges = [f1.edges().sort_by_distance(p)[0] for p in [
        (31.162555, 18.8, 11.6),
    ]]
    f7_2_side = f1.faces().sort_by_distance((31.162555, 18.8, 6.1))[0]
    chamfer(f7_2_edges, length=F7_2_SIZE, length2=F7_2_SIZE2, reference=f7_2_side)

    # F7#3
    f7_3_edges = [f1.edges().sort_by_distance(p)[0] for p in [
        (-1.4, -37.6, 11.6),
    ]]
    f7_3_side = f1.faces().sort_by_distance((-1.4, -37.6, 6.1))[0]
    chamfer(f7_3_edges, length=F7_3_SIZE, length2=F7_3_SIZE2, reference=f7_3_side)

    # F8
    f8_edges = [f1.edges().sort_by_distance(p)[0] for p in [
        (-0.433013, 0.25, 0.5),
        (0.433013, 0.25, 0.5),
        (0, -0.5, 0.5),
    ]]
    fillet(f8_edges, radius=F8_R)

    # F9
    f9_edges = [f1.edges().sort_by_distance(p)[0] for p in [
        (-22.25, -12.846043, 0),
        (-35.814997, 20.677798, 0),
        (0, 25.692087, 0),
        (35.814997, 20.677798, 0),
        (22.25, -12.846043, 0),
        (0, -41.355597, 0),
    ]]
    chamfer(f9_edges, length=F9_SIZE)


solid = f1.part
